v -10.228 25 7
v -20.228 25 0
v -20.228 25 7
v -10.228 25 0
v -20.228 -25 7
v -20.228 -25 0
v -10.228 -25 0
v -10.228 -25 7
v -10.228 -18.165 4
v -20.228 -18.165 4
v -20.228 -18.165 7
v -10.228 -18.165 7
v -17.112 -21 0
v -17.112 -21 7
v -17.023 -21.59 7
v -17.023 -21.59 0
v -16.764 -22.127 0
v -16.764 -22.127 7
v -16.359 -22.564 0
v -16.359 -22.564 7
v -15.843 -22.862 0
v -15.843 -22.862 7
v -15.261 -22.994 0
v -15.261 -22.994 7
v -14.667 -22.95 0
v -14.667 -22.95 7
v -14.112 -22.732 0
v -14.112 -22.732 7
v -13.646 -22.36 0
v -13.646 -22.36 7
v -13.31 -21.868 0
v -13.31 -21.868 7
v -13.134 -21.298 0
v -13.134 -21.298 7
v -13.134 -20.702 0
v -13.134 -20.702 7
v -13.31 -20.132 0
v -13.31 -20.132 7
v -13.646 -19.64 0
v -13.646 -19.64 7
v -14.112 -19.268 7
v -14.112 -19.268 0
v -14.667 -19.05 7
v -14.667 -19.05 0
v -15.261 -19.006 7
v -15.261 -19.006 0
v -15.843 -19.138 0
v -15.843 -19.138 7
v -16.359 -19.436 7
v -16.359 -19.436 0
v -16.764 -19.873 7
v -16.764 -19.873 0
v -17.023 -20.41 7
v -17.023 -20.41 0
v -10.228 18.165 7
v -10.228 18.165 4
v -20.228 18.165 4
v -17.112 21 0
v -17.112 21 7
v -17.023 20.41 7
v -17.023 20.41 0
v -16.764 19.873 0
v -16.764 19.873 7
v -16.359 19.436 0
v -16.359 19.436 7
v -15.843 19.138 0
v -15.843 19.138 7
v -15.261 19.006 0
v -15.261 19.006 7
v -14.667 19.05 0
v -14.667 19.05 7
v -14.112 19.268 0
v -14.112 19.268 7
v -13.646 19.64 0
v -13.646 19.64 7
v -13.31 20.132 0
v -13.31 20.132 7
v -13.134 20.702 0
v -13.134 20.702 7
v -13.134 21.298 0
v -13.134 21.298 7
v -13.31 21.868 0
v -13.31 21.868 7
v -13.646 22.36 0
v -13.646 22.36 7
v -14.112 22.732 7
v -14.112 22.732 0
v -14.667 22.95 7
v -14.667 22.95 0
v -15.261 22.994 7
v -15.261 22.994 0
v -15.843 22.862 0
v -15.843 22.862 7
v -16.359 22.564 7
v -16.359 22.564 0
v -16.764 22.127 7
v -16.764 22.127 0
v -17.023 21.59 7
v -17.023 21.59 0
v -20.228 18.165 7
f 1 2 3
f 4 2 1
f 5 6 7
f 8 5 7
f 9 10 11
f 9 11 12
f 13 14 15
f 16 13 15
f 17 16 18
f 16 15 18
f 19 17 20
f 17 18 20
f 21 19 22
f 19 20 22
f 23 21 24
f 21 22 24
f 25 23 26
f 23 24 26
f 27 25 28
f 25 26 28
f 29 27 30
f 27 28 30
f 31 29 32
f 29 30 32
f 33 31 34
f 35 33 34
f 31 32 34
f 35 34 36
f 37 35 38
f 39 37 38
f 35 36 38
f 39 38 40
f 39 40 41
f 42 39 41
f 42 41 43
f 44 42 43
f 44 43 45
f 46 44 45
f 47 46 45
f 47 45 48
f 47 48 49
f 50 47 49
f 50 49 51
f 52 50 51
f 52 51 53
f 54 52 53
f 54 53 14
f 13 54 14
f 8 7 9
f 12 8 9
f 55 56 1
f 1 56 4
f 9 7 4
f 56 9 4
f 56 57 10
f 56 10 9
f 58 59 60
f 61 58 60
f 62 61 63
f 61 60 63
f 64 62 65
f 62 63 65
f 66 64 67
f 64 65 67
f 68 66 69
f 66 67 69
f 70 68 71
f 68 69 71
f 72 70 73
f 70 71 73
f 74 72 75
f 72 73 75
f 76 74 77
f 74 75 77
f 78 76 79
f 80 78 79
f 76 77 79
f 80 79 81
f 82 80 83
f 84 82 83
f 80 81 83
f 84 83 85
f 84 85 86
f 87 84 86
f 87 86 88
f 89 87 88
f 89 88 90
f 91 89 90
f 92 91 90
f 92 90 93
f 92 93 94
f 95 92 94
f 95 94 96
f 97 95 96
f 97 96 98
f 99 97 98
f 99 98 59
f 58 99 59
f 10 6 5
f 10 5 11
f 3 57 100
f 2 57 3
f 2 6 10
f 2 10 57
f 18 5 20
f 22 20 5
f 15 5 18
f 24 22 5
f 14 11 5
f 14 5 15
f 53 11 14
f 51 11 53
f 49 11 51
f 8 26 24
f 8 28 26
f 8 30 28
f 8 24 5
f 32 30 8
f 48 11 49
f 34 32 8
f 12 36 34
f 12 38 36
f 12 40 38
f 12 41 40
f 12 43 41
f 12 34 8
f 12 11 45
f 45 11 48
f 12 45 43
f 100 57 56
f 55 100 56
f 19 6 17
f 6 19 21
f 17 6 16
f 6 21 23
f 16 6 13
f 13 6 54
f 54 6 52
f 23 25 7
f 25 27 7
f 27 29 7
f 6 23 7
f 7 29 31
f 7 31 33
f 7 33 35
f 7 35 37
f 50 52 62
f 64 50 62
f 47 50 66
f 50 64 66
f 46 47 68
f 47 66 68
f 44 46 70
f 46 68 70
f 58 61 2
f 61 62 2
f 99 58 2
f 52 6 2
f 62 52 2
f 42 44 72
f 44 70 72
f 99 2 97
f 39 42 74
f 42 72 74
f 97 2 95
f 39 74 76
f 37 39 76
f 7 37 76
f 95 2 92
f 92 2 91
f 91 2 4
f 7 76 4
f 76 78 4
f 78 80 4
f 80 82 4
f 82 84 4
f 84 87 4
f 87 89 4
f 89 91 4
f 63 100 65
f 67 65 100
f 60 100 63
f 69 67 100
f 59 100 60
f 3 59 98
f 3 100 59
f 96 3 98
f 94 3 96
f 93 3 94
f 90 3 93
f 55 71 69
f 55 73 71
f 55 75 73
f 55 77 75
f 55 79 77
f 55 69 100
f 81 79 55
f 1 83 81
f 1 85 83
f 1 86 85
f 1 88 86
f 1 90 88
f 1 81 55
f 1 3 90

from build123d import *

# Parameters (mm, degrees)
F0_W     = 10
F0_H     = 50
F1_DEPTH = 4
F2_W     = 10
F2_H     = 6.834782
F3_DEPTH = 3
F5_D     = 4


with BuildPart() as f1:
    # F0 (on Top) → F1 (new body)
    with BuildSketch(Plane.XY):
        with Locations((-15.227972, 0)):
            Rectangle(F0_W, F0_H)
    extrude(amount=F1_DEPTH)

    # F2 (on face) → F3 (join)
    with BuildSketch(Plane.XY.offset(4)):
        with Locations((-15.227972, 21.582609)):
            Rectangle(F2_W, F2_H)
        with Locations((-15.227972, -21.582609)):
            Rectangle(F2_W, F2_H)
    extrude(amount=F3_DEPTH)

    # F5 (through all)
    with Locations(Plane(origin=(0, 0, 0), x_dir=(1, 0, 0), z_dir=(0, 0, -1))):
        with Locations((-15.111843, 21), (-15.111843, -21)):
            Hole(F5_D / 2)


solid = f1.part
